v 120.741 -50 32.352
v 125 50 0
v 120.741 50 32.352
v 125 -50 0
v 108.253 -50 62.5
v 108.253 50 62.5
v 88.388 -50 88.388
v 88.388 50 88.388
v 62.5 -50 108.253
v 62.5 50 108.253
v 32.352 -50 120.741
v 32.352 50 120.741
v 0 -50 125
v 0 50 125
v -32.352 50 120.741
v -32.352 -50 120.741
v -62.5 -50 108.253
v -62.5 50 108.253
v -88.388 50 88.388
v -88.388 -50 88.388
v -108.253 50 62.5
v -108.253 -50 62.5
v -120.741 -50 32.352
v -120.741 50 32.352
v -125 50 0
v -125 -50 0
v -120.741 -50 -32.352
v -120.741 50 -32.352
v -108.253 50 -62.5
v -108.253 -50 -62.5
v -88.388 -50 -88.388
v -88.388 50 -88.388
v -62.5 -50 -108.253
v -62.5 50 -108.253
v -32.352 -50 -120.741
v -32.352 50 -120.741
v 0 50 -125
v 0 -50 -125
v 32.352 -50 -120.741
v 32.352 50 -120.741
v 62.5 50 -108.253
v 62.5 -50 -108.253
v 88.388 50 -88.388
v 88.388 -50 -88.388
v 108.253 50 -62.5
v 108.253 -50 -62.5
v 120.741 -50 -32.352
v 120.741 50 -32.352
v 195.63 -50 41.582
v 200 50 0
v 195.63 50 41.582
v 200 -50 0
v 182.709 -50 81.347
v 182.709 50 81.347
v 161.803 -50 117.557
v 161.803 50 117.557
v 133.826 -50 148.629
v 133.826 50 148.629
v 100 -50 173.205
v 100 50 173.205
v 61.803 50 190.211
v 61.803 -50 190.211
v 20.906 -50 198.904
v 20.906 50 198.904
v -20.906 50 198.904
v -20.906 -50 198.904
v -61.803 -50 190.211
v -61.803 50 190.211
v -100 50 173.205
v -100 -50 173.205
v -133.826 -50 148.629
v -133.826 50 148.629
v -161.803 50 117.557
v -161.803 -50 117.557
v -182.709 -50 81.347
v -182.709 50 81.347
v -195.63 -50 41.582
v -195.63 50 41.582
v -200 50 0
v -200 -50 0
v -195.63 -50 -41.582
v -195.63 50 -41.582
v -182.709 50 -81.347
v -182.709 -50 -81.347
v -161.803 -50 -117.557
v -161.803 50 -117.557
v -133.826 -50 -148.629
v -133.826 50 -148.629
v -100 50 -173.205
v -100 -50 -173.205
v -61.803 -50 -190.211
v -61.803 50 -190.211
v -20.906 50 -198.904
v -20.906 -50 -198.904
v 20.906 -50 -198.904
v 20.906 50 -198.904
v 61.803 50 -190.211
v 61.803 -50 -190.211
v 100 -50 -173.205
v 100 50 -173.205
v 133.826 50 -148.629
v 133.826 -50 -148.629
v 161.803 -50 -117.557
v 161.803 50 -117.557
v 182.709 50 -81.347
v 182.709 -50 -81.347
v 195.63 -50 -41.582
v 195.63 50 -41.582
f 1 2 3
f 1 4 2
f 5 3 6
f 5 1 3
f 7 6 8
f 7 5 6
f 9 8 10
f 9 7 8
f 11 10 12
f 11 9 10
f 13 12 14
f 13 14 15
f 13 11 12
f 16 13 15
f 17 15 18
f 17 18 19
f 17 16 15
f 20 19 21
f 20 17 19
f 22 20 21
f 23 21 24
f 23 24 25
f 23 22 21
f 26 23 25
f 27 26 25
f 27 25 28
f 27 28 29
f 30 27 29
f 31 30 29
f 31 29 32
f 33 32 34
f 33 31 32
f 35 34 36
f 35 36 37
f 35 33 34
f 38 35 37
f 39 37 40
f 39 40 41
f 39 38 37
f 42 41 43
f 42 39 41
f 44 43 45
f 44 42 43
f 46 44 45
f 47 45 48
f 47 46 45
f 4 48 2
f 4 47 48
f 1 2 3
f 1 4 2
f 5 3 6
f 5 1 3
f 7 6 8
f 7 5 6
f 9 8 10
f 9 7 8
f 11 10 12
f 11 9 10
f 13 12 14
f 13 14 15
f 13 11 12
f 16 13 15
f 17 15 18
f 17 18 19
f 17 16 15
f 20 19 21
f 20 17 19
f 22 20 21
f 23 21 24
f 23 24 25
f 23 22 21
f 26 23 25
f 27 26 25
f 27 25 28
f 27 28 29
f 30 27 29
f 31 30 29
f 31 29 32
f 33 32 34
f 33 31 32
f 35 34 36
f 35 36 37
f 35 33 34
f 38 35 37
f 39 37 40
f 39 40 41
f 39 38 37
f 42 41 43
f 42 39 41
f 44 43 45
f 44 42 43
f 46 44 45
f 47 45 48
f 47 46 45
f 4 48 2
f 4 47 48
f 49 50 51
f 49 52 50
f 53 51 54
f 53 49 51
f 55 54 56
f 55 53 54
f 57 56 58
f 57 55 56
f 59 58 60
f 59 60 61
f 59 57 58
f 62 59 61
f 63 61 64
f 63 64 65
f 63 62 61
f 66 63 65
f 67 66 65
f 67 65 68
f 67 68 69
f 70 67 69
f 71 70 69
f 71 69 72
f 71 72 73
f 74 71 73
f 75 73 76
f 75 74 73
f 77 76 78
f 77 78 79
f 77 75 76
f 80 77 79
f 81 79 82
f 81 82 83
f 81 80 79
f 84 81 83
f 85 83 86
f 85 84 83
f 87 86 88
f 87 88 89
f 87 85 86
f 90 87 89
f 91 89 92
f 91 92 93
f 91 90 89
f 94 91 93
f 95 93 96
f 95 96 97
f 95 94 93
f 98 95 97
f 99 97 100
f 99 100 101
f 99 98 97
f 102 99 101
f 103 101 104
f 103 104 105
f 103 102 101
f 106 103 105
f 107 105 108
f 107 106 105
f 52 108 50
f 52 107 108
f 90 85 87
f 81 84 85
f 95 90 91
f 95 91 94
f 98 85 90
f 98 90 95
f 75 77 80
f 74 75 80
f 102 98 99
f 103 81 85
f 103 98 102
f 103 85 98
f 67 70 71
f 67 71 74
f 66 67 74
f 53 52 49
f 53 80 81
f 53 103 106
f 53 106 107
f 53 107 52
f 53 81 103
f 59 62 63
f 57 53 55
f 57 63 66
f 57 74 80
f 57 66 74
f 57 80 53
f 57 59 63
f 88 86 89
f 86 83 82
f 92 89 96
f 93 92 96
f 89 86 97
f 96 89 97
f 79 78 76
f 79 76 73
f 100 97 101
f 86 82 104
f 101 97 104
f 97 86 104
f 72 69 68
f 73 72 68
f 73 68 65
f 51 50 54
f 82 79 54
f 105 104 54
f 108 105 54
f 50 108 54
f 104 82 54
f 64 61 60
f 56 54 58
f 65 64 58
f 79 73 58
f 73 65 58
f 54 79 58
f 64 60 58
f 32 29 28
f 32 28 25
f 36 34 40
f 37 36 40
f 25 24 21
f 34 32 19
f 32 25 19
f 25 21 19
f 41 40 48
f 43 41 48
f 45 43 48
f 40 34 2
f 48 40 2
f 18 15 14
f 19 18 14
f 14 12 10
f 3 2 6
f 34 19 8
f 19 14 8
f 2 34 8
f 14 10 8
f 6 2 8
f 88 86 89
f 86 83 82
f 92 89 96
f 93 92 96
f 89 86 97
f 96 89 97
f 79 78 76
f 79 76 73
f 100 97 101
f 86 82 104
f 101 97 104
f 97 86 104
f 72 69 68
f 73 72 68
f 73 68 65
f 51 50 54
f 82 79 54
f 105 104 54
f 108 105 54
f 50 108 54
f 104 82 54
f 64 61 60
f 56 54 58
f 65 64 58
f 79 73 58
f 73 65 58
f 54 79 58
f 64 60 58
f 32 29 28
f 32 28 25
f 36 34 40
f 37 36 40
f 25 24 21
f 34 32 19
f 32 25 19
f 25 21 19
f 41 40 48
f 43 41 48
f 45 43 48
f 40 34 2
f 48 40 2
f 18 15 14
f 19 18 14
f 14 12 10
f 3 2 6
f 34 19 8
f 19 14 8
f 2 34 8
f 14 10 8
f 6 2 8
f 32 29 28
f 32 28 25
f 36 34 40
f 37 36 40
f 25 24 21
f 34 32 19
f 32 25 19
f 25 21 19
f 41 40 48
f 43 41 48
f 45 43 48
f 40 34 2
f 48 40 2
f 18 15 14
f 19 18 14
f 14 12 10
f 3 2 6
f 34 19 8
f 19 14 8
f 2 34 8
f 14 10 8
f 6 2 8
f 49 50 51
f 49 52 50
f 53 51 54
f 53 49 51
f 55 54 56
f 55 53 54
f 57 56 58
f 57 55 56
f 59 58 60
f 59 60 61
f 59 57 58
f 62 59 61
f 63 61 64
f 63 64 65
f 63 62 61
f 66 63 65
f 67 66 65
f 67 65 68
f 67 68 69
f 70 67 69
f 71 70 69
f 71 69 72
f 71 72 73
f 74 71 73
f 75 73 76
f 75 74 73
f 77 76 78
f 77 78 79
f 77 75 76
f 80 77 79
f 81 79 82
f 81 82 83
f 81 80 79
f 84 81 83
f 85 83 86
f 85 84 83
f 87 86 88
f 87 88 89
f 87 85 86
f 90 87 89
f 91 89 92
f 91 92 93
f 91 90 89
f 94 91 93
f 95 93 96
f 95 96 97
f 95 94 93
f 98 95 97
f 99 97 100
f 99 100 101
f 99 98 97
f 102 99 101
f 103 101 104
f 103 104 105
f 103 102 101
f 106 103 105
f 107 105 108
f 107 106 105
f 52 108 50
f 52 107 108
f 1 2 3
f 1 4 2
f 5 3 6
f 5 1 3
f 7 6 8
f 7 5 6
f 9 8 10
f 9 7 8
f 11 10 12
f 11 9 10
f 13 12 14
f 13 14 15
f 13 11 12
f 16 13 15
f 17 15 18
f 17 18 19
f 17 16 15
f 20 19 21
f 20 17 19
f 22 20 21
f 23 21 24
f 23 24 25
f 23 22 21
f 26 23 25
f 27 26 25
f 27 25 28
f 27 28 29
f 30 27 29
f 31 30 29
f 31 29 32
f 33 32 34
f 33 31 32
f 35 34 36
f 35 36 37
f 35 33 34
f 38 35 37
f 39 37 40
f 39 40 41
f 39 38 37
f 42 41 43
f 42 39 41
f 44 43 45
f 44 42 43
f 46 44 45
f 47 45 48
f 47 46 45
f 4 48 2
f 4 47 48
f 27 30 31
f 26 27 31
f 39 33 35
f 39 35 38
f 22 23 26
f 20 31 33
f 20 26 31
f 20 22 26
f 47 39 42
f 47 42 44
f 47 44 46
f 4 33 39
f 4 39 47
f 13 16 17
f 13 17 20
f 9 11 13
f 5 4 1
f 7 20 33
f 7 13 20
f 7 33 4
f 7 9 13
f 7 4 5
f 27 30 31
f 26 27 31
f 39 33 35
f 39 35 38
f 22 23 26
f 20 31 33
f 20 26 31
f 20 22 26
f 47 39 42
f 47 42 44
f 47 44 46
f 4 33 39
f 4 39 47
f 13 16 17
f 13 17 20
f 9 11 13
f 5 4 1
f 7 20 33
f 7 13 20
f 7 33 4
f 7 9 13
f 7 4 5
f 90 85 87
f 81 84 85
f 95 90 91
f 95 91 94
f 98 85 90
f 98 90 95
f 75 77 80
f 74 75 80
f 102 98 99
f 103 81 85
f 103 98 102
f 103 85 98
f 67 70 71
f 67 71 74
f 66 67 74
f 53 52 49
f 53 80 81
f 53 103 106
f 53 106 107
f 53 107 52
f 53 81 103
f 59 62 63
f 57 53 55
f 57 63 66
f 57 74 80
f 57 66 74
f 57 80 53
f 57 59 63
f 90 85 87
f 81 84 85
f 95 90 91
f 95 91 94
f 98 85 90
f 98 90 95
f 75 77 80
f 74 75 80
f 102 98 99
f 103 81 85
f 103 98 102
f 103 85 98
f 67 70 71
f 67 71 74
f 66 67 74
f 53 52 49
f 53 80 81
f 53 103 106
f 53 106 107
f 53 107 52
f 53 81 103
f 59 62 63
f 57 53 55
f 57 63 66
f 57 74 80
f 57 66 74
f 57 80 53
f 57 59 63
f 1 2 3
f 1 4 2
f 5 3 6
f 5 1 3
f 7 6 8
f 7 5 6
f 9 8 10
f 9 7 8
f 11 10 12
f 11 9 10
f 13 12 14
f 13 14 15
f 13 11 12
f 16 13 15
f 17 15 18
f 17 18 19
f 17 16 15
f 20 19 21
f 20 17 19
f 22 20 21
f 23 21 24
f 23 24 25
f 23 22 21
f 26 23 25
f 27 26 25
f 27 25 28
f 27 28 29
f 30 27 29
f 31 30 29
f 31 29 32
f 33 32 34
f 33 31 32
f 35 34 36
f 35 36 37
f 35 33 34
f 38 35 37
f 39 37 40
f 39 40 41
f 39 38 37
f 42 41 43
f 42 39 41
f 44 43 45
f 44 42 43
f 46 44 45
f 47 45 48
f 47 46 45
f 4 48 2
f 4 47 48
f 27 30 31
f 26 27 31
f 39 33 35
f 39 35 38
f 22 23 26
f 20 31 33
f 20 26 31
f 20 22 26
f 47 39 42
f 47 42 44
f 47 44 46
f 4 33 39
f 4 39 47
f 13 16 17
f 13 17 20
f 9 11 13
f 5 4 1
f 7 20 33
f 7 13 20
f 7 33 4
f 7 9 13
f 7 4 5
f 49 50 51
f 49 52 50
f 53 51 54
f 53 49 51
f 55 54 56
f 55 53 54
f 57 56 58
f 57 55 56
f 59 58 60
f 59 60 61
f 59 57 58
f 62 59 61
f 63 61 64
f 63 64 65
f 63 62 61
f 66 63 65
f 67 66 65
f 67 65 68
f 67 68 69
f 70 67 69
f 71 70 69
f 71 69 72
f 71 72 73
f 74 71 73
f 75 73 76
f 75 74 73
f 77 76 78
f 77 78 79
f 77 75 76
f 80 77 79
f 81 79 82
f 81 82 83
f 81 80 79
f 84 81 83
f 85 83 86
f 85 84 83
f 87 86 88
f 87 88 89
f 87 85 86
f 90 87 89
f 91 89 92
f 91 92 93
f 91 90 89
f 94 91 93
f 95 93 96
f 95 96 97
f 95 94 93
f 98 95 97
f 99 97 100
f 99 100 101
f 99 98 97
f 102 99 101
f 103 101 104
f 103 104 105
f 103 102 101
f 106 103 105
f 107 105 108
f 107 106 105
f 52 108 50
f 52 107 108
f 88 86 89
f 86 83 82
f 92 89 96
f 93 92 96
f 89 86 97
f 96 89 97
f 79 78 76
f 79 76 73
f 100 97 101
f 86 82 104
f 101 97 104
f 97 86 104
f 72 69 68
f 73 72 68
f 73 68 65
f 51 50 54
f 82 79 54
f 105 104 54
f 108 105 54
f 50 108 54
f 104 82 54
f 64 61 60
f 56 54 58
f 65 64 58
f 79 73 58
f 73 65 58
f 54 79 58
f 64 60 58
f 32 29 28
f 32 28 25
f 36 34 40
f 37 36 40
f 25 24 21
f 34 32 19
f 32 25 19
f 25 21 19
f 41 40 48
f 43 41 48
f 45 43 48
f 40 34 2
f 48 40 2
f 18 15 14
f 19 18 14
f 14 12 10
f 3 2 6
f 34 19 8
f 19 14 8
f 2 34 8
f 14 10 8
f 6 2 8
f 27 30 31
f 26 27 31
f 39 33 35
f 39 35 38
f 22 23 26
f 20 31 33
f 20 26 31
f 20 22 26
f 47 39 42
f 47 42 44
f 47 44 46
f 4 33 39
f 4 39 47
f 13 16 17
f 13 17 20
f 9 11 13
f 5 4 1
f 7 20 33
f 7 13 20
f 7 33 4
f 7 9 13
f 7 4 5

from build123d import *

# Parameters (mm, degrees)
F6_R     = 200
F6_R_2   = 125
F7_DEPTH = 50
F0_R     = 125
F5_R     = 200
F5_R_2   = 125
F2_R     = 125
F1_R     = 200
F1_R_2   = 125
F3_R     = 125
F4_R     = 125


with BuildPart() as f7:
    # F6 (on face) → F7 (new body, symmetric)
    with BuildSketch(Plane.XZ):
        Circle(F6_R)
        Circle(F6_R_2, mode=Mode.SUBTRACT)
        Circle(F6_R_2)
    extrude(amount=F7_DEPTH, both=True)


with BuildPart() as f7b:
    # F0 (on Front) → F7, piece 2 (new body, symmetric)
    with BuildSketch(Plane.XZ):
        Circle(F0_R)
    extrude(amount=F7_DEPTH, both=True)


with BuildPart() as f7c:
    # F5 (on face) → F7, piece 3 (new body, symmetric)
    with BuildSketch(Plane.XZ):
        Circle(F5_R)
        Circle(F5_R_2, mode=Mode.SUBTRACT)
        Circle(F5_R_2)
    extrude(amount=F7_DEPTH, both=True)


with BuildPart() as f7d:
    # F2 (on face) → F7, piece 4 (new body, symmetric)
    with BuildSketch(Plane.XZ):
        Circle(F2_R)
    extrude(amount=F7_DEPTH, both=True)


with BuildPart() as f7e:
    # F1 (on face) → F7, piece 5 (new body, symmetric)
    with BuildSketch(Plane.XZ):
        Circle(F1_R)
        Circle(F1_R_2, mode=Mode.SUBTRACT)
        Circle(F1_R_2)
    extrude(amount=F7_DEPTH, both=True)


with BuildPart() as f7f:
    # F3 (on face) → F7, piece 6 (new body, symmetric)
    with BuildSketch(Plane.XZ):
        Circle(F3_R)
    extrude(amount=F7_DEPTH, both=True)


with BuildPart() as f7g:
    # F4 (on face) → F7, piece 7 (new body, symmetric)
    with BuildSketch(Plane.XZ):
        Circle(F4_R)
    extrude(amount=F7_DEPTH, both=True)


solid = Compound([f7.part, f7b.part, f7c.part, f7d.part, f7e.part, f7f.part, f7g.part])
